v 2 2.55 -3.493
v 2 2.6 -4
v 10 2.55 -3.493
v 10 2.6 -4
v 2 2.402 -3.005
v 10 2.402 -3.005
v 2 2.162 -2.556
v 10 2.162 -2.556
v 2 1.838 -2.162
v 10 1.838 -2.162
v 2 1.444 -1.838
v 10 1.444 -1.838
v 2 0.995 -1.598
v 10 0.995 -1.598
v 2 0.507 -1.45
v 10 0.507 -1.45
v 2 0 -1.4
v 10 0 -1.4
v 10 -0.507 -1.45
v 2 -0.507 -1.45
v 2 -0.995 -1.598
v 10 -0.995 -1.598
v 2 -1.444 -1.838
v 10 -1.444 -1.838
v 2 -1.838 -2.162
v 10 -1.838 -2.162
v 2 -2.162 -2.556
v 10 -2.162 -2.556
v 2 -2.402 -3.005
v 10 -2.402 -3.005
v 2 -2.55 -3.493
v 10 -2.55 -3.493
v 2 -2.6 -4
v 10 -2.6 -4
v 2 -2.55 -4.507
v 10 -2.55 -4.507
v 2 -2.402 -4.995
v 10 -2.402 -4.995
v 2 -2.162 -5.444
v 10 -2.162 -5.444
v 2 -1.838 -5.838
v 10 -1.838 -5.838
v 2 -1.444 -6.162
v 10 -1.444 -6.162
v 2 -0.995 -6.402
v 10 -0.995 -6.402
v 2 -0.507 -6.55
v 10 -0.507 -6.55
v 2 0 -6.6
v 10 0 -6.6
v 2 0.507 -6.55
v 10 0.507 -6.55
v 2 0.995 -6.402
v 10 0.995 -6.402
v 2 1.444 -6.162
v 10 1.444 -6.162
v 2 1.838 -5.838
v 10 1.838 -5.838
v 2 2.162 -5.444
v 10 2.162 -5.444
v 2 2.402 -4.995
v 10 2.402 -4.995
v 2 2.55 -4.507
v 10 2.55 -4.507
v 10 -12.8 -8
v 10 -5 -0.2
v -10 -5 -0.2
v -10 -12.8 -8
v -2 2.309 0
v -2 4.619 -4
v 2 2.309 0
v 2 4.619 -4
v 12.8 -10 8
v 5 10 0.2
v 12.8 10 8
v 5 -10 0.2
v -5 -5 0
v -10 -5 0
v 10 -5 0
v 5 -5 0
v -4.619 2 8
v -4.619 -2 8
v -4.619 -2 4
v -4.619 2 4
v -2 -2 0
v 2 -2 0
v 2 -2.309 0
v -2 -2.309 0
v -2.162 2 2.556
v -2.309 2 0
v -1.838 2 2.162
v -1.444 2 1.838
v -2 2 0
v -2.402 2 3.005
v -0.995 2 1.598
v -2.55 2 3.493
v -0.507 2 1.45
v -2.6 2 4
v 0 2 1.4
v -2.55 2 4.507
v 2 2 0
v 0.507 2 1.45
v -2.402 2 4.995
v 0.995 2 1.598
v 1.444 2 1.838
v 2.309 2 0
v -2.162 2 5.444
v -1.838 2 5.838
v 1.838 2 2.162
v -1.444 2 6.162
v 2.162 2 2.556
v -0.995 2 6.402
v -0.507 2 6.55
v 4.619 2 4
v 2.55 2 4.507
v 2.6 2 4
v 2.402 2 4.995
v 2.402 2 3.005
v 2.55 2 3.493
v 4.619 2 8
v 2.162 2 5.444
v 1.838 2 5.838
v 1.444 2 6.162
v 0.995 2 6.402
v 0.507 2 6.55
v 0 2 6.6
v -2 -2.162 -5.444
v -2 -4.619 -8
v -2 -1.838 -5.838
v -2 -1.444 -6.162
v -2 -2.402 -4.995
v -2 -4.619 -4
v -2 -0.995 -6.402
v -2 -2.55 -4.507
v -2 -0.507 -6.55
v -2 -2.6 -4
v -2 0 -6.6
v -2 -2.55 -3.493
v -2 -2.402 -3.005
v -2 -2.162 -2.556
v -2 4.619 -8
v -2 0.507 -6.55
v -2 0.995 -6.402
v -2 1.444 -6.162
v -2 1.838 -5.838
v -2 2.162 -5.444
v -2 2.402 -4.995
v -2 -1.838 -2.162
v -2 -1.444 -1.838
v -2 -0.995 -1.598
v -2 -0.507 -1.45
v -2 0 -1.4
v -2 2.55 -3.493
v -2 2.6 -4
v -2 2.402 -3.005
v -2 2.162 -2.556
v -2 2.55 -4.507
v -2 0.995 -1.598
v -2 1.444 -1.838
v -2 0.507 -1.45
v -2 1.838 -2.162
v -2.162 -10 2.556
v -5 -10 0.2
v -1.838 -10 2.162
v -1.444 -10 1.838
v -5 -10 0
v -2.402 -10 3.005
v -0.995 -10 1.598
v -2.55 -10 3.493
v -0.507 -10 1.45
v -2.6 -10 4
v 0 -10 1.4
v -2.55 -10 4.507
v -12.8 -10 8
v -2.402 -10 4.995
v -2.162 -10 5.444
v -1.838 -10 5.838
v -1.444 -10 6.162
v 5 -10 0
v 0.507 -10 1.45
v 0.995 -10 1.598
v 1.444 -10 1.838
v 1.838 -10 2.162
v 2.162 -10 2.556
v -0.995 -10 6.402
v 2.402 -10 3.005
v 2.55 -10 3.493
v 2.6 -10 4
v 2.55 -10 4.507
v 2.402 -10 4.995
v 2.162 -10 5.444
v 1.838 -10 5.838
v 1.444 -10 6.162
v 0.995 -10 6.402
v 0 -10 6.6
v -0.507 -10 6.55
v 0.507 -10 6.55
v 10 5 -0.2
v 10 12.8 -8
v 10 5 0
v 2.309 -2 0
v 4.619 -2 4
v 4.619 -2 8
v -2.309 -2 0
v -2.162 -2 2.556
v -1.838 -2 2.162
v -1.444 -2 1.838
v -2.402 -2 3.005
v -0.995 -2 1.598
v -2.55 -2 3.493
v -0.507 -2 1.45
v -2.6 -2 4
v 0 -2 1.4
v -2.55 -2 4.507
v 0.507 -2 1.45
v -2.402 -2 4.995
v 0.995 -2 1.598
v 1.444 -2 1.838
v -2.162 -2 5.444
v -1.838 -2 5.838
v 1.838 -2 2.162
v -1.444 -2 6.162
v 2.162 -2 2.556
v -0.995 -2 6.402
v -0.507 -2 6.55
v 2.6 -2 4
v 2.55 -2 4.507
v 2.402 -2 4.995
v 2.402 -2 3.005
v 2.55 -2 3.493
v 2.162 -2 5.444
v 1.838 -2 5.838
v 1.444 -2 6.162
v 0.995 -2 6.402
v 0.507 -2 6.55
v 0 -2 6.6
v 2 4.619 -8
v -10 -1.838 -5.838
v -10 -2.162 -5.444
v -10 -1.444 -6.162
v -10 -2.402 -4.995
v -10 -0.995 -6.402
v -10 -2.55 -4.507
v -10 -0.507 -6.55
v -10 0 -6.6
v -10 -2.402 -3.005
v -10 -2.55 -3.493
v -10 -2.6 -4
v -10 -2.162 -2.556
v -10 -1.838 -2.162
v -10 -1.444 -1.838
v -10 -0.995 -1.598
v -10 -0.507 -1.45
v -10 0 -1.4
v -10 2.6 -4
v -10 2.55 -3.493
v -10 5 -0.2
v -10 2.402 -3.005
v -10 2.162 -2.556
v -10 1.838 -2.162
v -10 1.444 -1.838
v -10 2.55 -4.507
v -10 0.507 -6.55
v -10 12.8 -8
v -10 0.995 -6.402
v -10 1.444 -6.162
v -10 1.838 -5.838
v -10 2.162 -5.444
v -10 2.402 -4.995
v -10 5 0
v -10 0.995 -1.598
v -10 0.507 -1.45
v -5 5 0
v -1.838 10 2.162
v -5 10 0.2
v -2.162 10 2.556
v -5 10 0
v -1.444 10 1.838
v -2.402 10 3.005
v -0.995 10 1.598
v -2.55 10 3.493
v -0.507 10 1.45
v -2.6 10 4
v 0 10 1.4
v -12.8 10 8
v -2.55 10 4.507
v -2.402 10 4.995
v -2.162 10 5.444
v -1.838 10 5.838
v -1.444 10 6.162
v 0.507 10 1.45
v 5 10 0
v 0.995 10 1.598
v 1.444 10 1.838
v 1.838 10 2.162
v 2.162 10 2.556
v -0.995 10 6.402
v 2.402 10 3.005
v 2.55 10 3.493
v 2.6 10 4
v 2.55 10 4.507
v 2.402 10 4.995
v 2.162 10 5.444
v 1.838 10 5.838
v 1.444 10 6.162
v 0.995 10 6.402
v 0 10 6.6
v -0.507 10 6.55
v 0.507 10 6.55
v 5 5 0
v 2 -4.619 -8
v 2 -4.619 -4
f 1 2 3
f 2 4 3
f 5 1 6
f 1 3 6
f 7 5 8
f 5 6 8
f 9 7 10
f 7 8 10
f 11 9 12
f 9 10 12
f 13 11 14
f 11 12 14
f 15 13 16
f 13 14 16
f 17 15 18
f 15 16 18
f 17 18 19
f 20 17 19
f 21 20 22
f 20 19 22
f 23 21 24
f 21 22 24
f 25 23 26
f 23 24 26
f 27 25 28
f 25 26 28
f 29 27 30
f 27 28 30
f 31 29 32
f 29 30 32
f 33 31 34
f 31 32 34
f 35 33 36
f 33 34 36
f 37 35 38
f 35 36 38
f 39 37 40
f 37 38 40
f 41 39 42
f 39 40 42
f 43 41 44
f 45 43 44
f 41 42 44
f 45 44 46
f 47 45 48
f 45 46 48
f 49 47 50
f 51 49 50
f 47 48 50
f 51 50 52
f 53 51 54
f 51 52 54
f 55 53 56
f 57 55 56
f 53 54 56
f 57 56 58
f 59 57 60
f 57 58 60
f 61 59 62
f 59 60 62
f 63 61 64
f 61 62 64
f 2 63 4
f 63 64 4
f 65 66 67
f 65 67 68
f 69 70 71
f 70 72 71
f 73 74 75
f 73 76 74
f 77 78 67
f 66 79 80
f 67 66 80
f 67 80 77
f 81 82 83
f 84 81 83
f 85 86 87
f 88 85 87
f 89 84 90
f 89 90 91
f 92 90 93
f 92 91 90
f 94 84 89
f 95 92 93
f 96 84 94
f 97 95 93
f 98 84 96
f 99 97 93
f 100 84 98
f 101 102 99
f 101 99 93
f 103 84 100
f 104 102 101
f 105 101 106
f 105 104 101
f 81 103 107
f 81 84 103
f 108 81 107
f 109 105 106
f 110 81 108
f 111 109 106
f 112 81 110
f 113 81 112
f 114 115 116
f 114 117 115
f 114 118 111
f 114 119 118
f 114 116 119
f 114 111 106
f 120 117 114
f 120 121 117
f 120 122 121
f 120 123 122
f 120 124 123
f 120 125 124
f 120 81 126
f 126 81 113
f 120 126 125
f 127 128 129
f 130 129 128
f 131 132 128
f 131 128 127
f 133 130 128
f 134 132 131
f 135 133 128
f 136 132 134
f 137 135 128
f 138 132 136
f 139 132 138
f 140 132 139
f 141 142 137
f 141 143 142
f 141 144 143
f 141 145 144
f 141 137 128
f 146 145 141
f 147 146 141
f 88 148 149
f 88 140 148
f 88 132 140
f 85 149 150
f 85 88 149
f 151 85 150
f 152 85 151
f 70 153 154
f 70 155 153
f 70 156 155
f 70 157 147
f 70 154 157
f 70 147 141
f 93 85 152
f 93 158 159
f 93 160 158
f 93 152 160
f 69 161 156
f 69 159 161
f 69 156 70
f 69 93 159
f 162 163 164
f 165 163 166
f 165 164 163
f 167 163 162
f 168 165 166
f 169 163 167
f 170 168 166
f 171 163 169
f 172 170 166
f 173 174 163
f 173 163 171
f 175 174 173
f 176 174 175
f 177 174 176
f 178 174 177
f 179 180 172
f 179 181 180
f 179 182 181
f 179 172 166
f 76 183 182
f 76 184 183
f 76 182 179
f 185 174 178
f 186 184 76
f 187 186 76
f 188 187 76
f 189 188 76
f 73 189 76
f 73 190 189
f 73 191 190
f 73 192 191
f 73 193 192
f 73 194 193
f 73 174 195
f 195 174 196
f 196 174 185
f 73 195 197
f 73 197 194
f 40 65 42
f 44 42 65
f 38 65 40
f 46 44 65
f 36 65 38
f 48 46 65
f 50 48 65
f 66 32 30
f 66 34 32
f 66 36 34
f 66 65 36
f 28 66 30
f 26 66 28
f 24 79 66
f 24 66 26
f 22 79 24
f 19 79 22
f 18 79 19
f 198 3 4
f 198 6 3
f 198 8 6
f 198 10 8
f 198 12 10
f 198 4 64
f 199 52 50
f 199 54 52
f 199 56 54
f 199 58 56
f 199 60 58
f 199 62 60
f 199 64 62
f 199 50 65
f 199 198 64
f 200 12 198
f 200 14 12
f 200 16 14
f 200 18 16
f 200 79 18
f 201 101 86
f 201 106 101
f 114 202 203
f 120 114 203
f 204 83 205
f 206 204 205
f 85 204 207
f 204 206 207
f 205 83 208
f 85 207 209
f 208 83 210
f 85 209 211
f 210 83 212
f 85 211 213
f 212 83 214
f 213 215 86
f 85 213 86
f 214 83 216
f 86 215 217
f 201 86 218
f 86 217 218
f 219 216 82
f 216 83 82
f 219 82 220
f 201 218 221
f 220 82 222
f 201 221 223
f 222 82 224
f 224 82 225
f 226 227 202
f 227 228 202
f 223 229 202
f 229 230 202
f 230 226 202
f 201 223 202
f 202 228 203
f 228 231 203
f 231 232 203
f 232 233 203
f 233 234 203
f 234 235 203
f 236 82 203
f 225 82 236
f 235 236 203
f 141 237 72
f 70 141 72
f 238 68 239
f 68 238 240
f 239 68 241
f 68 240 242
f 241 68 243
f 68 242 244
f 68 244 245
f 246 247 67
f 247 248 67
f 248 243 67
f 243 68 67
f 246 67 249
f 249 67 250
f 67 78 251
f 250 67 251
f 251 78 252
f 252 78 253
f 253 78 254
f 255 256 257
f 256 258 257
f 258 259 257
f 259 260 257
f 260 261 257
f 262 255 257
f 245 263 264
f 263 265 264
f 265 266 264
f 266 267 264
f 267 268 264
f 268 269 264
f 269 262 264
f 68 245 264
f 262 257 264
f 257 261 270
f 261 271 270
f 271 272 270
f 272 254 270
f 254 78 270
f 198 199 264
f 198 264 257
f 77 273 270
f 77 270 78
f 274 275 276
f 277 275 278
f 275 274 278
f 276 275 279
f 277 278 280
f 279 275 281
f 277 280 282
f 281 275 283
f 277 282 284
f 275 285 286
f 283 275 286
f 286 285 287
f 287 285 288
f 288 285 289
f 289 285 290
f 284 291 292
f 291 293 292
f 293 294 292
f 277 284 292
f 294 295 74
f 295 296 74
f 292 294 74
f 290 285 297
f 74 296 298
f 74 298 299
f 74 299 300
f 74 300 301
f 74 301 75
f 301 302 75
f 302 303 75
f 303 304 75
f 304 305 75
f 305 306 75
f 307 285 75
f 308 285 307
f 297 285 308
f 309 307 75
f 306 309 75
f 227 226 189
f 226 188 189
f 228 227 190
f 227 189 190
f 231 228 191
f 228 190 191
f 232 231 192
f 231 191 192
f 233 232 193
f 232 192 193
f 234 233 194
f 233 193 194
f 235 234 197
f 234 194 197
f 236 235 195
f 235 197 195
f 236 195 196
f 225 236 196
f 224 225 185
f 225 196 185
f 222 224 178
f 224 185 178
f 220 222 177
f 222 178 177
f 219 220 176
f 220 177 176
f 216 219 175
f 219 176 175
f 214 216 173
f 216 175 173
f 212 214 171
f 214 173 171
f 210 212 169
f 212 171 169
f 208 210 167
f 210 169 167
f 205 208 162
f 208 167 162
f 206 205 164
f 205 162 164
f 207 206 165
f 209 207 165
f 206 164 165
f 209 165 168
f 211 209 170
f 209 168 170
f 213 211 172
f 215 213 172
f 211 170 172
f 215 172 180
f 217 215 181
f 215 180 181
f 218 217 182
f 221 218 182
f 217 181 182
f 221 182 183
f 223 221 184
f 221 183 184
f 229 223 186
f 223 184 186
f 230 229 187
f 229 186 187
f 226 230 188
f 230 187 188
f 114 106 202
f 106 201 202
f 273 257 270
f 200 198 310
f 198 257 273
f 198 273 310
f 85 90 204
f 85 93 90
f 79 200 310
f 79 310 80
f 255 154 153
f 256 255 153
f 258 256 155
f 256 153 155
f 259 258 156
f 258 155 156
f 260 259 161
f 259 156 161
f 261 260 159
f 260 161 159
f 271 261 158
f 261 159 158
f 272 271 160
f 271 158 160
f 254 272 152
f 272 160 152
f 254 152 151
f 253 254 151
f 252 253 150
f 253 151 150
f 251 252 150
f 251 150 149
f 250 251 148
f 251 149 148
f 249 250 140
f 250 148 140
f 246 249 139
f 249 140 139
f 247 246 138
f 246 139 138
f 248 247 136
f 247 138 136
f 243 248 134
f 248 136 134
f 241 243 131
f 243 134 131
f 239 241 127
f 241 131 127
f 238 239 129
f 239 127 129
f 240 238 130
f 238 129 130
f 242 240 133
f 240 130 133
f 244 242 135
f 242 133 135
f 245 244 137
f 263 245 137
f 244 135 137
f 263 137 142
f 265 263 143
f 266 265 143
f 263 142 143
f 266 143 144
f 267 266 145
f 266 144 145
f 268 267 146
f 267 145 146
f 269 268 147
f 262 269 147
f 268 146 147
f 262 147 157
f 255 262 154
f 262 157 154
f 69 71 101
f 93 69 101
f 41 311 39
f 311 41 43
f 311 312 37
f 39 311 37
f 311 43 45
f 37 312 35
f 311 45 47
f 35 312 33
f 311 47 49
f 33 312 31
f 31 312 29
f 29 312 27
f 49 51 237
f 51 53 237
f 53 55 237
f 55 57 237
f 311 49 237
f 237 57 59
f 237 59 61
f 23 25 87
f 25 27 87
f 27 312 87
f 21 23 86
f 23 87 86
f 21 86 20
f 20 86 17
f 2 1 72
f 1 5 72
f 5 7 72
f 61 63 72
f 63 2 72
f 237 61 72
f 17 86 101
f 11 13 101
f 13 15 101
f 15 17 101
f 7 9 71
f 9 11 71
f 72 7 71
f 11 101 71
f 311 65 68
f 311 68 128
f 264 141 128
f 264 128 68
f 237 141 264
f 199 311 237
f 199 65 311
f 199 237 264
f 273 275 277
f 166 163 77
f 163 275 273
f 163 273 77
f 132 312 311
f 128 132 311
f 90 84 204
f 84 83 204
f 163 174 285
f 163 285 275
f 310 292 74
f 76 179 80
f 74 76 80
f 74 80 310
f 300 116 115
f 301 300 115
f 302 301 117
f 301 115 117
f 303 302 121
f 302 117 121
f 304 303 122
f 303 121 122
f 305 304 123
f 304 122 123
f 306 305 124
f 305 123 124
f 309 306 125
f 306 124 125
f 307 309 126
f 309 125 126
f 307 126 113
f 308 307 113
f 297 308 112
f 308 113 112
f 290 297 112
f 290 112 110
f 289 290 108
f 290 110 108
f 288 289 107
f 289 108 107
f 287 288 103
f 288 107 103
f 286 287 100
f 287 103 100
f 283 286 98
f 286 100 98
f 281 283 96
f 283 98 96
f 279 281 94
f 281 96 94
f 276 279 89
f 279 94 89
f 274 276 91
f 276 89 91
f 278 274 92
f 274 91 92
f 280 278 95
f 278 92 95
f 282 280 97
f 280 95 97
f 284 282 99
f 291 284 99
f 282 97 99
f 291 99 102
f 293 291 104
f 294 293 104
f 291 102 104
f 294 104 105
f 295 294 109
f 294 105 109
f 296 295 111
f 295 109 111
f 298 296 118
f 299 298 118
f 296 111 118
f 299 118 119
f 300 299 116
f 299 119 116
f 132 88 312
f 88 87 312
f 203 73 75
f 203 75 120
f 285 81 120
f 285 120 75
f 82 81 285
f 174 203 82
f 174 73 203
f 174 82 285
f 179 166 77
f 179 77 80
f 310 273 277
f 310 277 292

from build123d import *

# Parameters (mm, degrees)
F1_DEPTH  = 10
F4_DEPTH  = 2
F7_R      = 2.6
F8_DEPTH  = 10
F9_DEPTH  = 10
F10_DEPTH = 2
F6_R      = 2.6
F11_DEPTH = 10


with BuildPart() as f1:
    # F0 (on Front) → F1 (new body, symmetric)
    with BuildSketch(Plane.XZ):
        Polygon((12.8, 8), (0, 8), (-12.8, 8), (-5, 0.2), (-5, 0), (0, 0), (5, 0), (5, 0.2), align=None)
    extrude(amount=F1_DEPTH, both=True)

    # F3 (on Front) → F4 (cut, symmetric)
    with BuildSketch(Plane.XZ):
        Polygon((2.3094010768, 0), (4.6188021535, 4), (4.6188021535, 8), (-4.6188021535, 8), (-4.6188021535, 4), (-2.3094010768, 0), align=None)
    extrude(amount=F4_DEPTH, both=True, mode=Mode.SUBTRACT)

    # F7 (on Front) → F8 (cut, symmetric)
    with BuildSketch(Plane.XZ):
        with Locations((0, 4)):
            Circle(F7_R)
    extrude(amount=F8_DEPTH, both=True, mode=Mode.SUBTRACT)

    # F2 (on Right) → F9 (join, symmetric)
    with BuildSketch(Plane.YZ):
        Polygon((-5, 0), (-5, -0.2), (-12.8, -8), (0, -8), (12.8, -8), (5, -0.2), (5, 0), (0, 0), align=None)
    extrude(amount=F9_DEPTH, both=True)

    # F5 (on Right) → F10 (cut, symmetric)
    with BuildSketch(Plane.YZ):
        Polygon((-2.3094010768, 0), (-4.6188021535, -4), (-4.6188021535, -8), (4.6188021535, -8), (4.6188021535, -4), (2.3094010768, 0), align=None)
    extrude(amount=F10_DEPTH, both=True, mode=Mode.SUBTRACT)

    # F6 (on Right) → F11 (cut, symmetric)
    with BuildSketch(Plane.YZ):
        with Locations((0, -4)):
            Circle(F6_R)
    extrude(amount=F11_DEPTH, both=True, mode=Mode.SUBTRACT)


solid = f1.part
